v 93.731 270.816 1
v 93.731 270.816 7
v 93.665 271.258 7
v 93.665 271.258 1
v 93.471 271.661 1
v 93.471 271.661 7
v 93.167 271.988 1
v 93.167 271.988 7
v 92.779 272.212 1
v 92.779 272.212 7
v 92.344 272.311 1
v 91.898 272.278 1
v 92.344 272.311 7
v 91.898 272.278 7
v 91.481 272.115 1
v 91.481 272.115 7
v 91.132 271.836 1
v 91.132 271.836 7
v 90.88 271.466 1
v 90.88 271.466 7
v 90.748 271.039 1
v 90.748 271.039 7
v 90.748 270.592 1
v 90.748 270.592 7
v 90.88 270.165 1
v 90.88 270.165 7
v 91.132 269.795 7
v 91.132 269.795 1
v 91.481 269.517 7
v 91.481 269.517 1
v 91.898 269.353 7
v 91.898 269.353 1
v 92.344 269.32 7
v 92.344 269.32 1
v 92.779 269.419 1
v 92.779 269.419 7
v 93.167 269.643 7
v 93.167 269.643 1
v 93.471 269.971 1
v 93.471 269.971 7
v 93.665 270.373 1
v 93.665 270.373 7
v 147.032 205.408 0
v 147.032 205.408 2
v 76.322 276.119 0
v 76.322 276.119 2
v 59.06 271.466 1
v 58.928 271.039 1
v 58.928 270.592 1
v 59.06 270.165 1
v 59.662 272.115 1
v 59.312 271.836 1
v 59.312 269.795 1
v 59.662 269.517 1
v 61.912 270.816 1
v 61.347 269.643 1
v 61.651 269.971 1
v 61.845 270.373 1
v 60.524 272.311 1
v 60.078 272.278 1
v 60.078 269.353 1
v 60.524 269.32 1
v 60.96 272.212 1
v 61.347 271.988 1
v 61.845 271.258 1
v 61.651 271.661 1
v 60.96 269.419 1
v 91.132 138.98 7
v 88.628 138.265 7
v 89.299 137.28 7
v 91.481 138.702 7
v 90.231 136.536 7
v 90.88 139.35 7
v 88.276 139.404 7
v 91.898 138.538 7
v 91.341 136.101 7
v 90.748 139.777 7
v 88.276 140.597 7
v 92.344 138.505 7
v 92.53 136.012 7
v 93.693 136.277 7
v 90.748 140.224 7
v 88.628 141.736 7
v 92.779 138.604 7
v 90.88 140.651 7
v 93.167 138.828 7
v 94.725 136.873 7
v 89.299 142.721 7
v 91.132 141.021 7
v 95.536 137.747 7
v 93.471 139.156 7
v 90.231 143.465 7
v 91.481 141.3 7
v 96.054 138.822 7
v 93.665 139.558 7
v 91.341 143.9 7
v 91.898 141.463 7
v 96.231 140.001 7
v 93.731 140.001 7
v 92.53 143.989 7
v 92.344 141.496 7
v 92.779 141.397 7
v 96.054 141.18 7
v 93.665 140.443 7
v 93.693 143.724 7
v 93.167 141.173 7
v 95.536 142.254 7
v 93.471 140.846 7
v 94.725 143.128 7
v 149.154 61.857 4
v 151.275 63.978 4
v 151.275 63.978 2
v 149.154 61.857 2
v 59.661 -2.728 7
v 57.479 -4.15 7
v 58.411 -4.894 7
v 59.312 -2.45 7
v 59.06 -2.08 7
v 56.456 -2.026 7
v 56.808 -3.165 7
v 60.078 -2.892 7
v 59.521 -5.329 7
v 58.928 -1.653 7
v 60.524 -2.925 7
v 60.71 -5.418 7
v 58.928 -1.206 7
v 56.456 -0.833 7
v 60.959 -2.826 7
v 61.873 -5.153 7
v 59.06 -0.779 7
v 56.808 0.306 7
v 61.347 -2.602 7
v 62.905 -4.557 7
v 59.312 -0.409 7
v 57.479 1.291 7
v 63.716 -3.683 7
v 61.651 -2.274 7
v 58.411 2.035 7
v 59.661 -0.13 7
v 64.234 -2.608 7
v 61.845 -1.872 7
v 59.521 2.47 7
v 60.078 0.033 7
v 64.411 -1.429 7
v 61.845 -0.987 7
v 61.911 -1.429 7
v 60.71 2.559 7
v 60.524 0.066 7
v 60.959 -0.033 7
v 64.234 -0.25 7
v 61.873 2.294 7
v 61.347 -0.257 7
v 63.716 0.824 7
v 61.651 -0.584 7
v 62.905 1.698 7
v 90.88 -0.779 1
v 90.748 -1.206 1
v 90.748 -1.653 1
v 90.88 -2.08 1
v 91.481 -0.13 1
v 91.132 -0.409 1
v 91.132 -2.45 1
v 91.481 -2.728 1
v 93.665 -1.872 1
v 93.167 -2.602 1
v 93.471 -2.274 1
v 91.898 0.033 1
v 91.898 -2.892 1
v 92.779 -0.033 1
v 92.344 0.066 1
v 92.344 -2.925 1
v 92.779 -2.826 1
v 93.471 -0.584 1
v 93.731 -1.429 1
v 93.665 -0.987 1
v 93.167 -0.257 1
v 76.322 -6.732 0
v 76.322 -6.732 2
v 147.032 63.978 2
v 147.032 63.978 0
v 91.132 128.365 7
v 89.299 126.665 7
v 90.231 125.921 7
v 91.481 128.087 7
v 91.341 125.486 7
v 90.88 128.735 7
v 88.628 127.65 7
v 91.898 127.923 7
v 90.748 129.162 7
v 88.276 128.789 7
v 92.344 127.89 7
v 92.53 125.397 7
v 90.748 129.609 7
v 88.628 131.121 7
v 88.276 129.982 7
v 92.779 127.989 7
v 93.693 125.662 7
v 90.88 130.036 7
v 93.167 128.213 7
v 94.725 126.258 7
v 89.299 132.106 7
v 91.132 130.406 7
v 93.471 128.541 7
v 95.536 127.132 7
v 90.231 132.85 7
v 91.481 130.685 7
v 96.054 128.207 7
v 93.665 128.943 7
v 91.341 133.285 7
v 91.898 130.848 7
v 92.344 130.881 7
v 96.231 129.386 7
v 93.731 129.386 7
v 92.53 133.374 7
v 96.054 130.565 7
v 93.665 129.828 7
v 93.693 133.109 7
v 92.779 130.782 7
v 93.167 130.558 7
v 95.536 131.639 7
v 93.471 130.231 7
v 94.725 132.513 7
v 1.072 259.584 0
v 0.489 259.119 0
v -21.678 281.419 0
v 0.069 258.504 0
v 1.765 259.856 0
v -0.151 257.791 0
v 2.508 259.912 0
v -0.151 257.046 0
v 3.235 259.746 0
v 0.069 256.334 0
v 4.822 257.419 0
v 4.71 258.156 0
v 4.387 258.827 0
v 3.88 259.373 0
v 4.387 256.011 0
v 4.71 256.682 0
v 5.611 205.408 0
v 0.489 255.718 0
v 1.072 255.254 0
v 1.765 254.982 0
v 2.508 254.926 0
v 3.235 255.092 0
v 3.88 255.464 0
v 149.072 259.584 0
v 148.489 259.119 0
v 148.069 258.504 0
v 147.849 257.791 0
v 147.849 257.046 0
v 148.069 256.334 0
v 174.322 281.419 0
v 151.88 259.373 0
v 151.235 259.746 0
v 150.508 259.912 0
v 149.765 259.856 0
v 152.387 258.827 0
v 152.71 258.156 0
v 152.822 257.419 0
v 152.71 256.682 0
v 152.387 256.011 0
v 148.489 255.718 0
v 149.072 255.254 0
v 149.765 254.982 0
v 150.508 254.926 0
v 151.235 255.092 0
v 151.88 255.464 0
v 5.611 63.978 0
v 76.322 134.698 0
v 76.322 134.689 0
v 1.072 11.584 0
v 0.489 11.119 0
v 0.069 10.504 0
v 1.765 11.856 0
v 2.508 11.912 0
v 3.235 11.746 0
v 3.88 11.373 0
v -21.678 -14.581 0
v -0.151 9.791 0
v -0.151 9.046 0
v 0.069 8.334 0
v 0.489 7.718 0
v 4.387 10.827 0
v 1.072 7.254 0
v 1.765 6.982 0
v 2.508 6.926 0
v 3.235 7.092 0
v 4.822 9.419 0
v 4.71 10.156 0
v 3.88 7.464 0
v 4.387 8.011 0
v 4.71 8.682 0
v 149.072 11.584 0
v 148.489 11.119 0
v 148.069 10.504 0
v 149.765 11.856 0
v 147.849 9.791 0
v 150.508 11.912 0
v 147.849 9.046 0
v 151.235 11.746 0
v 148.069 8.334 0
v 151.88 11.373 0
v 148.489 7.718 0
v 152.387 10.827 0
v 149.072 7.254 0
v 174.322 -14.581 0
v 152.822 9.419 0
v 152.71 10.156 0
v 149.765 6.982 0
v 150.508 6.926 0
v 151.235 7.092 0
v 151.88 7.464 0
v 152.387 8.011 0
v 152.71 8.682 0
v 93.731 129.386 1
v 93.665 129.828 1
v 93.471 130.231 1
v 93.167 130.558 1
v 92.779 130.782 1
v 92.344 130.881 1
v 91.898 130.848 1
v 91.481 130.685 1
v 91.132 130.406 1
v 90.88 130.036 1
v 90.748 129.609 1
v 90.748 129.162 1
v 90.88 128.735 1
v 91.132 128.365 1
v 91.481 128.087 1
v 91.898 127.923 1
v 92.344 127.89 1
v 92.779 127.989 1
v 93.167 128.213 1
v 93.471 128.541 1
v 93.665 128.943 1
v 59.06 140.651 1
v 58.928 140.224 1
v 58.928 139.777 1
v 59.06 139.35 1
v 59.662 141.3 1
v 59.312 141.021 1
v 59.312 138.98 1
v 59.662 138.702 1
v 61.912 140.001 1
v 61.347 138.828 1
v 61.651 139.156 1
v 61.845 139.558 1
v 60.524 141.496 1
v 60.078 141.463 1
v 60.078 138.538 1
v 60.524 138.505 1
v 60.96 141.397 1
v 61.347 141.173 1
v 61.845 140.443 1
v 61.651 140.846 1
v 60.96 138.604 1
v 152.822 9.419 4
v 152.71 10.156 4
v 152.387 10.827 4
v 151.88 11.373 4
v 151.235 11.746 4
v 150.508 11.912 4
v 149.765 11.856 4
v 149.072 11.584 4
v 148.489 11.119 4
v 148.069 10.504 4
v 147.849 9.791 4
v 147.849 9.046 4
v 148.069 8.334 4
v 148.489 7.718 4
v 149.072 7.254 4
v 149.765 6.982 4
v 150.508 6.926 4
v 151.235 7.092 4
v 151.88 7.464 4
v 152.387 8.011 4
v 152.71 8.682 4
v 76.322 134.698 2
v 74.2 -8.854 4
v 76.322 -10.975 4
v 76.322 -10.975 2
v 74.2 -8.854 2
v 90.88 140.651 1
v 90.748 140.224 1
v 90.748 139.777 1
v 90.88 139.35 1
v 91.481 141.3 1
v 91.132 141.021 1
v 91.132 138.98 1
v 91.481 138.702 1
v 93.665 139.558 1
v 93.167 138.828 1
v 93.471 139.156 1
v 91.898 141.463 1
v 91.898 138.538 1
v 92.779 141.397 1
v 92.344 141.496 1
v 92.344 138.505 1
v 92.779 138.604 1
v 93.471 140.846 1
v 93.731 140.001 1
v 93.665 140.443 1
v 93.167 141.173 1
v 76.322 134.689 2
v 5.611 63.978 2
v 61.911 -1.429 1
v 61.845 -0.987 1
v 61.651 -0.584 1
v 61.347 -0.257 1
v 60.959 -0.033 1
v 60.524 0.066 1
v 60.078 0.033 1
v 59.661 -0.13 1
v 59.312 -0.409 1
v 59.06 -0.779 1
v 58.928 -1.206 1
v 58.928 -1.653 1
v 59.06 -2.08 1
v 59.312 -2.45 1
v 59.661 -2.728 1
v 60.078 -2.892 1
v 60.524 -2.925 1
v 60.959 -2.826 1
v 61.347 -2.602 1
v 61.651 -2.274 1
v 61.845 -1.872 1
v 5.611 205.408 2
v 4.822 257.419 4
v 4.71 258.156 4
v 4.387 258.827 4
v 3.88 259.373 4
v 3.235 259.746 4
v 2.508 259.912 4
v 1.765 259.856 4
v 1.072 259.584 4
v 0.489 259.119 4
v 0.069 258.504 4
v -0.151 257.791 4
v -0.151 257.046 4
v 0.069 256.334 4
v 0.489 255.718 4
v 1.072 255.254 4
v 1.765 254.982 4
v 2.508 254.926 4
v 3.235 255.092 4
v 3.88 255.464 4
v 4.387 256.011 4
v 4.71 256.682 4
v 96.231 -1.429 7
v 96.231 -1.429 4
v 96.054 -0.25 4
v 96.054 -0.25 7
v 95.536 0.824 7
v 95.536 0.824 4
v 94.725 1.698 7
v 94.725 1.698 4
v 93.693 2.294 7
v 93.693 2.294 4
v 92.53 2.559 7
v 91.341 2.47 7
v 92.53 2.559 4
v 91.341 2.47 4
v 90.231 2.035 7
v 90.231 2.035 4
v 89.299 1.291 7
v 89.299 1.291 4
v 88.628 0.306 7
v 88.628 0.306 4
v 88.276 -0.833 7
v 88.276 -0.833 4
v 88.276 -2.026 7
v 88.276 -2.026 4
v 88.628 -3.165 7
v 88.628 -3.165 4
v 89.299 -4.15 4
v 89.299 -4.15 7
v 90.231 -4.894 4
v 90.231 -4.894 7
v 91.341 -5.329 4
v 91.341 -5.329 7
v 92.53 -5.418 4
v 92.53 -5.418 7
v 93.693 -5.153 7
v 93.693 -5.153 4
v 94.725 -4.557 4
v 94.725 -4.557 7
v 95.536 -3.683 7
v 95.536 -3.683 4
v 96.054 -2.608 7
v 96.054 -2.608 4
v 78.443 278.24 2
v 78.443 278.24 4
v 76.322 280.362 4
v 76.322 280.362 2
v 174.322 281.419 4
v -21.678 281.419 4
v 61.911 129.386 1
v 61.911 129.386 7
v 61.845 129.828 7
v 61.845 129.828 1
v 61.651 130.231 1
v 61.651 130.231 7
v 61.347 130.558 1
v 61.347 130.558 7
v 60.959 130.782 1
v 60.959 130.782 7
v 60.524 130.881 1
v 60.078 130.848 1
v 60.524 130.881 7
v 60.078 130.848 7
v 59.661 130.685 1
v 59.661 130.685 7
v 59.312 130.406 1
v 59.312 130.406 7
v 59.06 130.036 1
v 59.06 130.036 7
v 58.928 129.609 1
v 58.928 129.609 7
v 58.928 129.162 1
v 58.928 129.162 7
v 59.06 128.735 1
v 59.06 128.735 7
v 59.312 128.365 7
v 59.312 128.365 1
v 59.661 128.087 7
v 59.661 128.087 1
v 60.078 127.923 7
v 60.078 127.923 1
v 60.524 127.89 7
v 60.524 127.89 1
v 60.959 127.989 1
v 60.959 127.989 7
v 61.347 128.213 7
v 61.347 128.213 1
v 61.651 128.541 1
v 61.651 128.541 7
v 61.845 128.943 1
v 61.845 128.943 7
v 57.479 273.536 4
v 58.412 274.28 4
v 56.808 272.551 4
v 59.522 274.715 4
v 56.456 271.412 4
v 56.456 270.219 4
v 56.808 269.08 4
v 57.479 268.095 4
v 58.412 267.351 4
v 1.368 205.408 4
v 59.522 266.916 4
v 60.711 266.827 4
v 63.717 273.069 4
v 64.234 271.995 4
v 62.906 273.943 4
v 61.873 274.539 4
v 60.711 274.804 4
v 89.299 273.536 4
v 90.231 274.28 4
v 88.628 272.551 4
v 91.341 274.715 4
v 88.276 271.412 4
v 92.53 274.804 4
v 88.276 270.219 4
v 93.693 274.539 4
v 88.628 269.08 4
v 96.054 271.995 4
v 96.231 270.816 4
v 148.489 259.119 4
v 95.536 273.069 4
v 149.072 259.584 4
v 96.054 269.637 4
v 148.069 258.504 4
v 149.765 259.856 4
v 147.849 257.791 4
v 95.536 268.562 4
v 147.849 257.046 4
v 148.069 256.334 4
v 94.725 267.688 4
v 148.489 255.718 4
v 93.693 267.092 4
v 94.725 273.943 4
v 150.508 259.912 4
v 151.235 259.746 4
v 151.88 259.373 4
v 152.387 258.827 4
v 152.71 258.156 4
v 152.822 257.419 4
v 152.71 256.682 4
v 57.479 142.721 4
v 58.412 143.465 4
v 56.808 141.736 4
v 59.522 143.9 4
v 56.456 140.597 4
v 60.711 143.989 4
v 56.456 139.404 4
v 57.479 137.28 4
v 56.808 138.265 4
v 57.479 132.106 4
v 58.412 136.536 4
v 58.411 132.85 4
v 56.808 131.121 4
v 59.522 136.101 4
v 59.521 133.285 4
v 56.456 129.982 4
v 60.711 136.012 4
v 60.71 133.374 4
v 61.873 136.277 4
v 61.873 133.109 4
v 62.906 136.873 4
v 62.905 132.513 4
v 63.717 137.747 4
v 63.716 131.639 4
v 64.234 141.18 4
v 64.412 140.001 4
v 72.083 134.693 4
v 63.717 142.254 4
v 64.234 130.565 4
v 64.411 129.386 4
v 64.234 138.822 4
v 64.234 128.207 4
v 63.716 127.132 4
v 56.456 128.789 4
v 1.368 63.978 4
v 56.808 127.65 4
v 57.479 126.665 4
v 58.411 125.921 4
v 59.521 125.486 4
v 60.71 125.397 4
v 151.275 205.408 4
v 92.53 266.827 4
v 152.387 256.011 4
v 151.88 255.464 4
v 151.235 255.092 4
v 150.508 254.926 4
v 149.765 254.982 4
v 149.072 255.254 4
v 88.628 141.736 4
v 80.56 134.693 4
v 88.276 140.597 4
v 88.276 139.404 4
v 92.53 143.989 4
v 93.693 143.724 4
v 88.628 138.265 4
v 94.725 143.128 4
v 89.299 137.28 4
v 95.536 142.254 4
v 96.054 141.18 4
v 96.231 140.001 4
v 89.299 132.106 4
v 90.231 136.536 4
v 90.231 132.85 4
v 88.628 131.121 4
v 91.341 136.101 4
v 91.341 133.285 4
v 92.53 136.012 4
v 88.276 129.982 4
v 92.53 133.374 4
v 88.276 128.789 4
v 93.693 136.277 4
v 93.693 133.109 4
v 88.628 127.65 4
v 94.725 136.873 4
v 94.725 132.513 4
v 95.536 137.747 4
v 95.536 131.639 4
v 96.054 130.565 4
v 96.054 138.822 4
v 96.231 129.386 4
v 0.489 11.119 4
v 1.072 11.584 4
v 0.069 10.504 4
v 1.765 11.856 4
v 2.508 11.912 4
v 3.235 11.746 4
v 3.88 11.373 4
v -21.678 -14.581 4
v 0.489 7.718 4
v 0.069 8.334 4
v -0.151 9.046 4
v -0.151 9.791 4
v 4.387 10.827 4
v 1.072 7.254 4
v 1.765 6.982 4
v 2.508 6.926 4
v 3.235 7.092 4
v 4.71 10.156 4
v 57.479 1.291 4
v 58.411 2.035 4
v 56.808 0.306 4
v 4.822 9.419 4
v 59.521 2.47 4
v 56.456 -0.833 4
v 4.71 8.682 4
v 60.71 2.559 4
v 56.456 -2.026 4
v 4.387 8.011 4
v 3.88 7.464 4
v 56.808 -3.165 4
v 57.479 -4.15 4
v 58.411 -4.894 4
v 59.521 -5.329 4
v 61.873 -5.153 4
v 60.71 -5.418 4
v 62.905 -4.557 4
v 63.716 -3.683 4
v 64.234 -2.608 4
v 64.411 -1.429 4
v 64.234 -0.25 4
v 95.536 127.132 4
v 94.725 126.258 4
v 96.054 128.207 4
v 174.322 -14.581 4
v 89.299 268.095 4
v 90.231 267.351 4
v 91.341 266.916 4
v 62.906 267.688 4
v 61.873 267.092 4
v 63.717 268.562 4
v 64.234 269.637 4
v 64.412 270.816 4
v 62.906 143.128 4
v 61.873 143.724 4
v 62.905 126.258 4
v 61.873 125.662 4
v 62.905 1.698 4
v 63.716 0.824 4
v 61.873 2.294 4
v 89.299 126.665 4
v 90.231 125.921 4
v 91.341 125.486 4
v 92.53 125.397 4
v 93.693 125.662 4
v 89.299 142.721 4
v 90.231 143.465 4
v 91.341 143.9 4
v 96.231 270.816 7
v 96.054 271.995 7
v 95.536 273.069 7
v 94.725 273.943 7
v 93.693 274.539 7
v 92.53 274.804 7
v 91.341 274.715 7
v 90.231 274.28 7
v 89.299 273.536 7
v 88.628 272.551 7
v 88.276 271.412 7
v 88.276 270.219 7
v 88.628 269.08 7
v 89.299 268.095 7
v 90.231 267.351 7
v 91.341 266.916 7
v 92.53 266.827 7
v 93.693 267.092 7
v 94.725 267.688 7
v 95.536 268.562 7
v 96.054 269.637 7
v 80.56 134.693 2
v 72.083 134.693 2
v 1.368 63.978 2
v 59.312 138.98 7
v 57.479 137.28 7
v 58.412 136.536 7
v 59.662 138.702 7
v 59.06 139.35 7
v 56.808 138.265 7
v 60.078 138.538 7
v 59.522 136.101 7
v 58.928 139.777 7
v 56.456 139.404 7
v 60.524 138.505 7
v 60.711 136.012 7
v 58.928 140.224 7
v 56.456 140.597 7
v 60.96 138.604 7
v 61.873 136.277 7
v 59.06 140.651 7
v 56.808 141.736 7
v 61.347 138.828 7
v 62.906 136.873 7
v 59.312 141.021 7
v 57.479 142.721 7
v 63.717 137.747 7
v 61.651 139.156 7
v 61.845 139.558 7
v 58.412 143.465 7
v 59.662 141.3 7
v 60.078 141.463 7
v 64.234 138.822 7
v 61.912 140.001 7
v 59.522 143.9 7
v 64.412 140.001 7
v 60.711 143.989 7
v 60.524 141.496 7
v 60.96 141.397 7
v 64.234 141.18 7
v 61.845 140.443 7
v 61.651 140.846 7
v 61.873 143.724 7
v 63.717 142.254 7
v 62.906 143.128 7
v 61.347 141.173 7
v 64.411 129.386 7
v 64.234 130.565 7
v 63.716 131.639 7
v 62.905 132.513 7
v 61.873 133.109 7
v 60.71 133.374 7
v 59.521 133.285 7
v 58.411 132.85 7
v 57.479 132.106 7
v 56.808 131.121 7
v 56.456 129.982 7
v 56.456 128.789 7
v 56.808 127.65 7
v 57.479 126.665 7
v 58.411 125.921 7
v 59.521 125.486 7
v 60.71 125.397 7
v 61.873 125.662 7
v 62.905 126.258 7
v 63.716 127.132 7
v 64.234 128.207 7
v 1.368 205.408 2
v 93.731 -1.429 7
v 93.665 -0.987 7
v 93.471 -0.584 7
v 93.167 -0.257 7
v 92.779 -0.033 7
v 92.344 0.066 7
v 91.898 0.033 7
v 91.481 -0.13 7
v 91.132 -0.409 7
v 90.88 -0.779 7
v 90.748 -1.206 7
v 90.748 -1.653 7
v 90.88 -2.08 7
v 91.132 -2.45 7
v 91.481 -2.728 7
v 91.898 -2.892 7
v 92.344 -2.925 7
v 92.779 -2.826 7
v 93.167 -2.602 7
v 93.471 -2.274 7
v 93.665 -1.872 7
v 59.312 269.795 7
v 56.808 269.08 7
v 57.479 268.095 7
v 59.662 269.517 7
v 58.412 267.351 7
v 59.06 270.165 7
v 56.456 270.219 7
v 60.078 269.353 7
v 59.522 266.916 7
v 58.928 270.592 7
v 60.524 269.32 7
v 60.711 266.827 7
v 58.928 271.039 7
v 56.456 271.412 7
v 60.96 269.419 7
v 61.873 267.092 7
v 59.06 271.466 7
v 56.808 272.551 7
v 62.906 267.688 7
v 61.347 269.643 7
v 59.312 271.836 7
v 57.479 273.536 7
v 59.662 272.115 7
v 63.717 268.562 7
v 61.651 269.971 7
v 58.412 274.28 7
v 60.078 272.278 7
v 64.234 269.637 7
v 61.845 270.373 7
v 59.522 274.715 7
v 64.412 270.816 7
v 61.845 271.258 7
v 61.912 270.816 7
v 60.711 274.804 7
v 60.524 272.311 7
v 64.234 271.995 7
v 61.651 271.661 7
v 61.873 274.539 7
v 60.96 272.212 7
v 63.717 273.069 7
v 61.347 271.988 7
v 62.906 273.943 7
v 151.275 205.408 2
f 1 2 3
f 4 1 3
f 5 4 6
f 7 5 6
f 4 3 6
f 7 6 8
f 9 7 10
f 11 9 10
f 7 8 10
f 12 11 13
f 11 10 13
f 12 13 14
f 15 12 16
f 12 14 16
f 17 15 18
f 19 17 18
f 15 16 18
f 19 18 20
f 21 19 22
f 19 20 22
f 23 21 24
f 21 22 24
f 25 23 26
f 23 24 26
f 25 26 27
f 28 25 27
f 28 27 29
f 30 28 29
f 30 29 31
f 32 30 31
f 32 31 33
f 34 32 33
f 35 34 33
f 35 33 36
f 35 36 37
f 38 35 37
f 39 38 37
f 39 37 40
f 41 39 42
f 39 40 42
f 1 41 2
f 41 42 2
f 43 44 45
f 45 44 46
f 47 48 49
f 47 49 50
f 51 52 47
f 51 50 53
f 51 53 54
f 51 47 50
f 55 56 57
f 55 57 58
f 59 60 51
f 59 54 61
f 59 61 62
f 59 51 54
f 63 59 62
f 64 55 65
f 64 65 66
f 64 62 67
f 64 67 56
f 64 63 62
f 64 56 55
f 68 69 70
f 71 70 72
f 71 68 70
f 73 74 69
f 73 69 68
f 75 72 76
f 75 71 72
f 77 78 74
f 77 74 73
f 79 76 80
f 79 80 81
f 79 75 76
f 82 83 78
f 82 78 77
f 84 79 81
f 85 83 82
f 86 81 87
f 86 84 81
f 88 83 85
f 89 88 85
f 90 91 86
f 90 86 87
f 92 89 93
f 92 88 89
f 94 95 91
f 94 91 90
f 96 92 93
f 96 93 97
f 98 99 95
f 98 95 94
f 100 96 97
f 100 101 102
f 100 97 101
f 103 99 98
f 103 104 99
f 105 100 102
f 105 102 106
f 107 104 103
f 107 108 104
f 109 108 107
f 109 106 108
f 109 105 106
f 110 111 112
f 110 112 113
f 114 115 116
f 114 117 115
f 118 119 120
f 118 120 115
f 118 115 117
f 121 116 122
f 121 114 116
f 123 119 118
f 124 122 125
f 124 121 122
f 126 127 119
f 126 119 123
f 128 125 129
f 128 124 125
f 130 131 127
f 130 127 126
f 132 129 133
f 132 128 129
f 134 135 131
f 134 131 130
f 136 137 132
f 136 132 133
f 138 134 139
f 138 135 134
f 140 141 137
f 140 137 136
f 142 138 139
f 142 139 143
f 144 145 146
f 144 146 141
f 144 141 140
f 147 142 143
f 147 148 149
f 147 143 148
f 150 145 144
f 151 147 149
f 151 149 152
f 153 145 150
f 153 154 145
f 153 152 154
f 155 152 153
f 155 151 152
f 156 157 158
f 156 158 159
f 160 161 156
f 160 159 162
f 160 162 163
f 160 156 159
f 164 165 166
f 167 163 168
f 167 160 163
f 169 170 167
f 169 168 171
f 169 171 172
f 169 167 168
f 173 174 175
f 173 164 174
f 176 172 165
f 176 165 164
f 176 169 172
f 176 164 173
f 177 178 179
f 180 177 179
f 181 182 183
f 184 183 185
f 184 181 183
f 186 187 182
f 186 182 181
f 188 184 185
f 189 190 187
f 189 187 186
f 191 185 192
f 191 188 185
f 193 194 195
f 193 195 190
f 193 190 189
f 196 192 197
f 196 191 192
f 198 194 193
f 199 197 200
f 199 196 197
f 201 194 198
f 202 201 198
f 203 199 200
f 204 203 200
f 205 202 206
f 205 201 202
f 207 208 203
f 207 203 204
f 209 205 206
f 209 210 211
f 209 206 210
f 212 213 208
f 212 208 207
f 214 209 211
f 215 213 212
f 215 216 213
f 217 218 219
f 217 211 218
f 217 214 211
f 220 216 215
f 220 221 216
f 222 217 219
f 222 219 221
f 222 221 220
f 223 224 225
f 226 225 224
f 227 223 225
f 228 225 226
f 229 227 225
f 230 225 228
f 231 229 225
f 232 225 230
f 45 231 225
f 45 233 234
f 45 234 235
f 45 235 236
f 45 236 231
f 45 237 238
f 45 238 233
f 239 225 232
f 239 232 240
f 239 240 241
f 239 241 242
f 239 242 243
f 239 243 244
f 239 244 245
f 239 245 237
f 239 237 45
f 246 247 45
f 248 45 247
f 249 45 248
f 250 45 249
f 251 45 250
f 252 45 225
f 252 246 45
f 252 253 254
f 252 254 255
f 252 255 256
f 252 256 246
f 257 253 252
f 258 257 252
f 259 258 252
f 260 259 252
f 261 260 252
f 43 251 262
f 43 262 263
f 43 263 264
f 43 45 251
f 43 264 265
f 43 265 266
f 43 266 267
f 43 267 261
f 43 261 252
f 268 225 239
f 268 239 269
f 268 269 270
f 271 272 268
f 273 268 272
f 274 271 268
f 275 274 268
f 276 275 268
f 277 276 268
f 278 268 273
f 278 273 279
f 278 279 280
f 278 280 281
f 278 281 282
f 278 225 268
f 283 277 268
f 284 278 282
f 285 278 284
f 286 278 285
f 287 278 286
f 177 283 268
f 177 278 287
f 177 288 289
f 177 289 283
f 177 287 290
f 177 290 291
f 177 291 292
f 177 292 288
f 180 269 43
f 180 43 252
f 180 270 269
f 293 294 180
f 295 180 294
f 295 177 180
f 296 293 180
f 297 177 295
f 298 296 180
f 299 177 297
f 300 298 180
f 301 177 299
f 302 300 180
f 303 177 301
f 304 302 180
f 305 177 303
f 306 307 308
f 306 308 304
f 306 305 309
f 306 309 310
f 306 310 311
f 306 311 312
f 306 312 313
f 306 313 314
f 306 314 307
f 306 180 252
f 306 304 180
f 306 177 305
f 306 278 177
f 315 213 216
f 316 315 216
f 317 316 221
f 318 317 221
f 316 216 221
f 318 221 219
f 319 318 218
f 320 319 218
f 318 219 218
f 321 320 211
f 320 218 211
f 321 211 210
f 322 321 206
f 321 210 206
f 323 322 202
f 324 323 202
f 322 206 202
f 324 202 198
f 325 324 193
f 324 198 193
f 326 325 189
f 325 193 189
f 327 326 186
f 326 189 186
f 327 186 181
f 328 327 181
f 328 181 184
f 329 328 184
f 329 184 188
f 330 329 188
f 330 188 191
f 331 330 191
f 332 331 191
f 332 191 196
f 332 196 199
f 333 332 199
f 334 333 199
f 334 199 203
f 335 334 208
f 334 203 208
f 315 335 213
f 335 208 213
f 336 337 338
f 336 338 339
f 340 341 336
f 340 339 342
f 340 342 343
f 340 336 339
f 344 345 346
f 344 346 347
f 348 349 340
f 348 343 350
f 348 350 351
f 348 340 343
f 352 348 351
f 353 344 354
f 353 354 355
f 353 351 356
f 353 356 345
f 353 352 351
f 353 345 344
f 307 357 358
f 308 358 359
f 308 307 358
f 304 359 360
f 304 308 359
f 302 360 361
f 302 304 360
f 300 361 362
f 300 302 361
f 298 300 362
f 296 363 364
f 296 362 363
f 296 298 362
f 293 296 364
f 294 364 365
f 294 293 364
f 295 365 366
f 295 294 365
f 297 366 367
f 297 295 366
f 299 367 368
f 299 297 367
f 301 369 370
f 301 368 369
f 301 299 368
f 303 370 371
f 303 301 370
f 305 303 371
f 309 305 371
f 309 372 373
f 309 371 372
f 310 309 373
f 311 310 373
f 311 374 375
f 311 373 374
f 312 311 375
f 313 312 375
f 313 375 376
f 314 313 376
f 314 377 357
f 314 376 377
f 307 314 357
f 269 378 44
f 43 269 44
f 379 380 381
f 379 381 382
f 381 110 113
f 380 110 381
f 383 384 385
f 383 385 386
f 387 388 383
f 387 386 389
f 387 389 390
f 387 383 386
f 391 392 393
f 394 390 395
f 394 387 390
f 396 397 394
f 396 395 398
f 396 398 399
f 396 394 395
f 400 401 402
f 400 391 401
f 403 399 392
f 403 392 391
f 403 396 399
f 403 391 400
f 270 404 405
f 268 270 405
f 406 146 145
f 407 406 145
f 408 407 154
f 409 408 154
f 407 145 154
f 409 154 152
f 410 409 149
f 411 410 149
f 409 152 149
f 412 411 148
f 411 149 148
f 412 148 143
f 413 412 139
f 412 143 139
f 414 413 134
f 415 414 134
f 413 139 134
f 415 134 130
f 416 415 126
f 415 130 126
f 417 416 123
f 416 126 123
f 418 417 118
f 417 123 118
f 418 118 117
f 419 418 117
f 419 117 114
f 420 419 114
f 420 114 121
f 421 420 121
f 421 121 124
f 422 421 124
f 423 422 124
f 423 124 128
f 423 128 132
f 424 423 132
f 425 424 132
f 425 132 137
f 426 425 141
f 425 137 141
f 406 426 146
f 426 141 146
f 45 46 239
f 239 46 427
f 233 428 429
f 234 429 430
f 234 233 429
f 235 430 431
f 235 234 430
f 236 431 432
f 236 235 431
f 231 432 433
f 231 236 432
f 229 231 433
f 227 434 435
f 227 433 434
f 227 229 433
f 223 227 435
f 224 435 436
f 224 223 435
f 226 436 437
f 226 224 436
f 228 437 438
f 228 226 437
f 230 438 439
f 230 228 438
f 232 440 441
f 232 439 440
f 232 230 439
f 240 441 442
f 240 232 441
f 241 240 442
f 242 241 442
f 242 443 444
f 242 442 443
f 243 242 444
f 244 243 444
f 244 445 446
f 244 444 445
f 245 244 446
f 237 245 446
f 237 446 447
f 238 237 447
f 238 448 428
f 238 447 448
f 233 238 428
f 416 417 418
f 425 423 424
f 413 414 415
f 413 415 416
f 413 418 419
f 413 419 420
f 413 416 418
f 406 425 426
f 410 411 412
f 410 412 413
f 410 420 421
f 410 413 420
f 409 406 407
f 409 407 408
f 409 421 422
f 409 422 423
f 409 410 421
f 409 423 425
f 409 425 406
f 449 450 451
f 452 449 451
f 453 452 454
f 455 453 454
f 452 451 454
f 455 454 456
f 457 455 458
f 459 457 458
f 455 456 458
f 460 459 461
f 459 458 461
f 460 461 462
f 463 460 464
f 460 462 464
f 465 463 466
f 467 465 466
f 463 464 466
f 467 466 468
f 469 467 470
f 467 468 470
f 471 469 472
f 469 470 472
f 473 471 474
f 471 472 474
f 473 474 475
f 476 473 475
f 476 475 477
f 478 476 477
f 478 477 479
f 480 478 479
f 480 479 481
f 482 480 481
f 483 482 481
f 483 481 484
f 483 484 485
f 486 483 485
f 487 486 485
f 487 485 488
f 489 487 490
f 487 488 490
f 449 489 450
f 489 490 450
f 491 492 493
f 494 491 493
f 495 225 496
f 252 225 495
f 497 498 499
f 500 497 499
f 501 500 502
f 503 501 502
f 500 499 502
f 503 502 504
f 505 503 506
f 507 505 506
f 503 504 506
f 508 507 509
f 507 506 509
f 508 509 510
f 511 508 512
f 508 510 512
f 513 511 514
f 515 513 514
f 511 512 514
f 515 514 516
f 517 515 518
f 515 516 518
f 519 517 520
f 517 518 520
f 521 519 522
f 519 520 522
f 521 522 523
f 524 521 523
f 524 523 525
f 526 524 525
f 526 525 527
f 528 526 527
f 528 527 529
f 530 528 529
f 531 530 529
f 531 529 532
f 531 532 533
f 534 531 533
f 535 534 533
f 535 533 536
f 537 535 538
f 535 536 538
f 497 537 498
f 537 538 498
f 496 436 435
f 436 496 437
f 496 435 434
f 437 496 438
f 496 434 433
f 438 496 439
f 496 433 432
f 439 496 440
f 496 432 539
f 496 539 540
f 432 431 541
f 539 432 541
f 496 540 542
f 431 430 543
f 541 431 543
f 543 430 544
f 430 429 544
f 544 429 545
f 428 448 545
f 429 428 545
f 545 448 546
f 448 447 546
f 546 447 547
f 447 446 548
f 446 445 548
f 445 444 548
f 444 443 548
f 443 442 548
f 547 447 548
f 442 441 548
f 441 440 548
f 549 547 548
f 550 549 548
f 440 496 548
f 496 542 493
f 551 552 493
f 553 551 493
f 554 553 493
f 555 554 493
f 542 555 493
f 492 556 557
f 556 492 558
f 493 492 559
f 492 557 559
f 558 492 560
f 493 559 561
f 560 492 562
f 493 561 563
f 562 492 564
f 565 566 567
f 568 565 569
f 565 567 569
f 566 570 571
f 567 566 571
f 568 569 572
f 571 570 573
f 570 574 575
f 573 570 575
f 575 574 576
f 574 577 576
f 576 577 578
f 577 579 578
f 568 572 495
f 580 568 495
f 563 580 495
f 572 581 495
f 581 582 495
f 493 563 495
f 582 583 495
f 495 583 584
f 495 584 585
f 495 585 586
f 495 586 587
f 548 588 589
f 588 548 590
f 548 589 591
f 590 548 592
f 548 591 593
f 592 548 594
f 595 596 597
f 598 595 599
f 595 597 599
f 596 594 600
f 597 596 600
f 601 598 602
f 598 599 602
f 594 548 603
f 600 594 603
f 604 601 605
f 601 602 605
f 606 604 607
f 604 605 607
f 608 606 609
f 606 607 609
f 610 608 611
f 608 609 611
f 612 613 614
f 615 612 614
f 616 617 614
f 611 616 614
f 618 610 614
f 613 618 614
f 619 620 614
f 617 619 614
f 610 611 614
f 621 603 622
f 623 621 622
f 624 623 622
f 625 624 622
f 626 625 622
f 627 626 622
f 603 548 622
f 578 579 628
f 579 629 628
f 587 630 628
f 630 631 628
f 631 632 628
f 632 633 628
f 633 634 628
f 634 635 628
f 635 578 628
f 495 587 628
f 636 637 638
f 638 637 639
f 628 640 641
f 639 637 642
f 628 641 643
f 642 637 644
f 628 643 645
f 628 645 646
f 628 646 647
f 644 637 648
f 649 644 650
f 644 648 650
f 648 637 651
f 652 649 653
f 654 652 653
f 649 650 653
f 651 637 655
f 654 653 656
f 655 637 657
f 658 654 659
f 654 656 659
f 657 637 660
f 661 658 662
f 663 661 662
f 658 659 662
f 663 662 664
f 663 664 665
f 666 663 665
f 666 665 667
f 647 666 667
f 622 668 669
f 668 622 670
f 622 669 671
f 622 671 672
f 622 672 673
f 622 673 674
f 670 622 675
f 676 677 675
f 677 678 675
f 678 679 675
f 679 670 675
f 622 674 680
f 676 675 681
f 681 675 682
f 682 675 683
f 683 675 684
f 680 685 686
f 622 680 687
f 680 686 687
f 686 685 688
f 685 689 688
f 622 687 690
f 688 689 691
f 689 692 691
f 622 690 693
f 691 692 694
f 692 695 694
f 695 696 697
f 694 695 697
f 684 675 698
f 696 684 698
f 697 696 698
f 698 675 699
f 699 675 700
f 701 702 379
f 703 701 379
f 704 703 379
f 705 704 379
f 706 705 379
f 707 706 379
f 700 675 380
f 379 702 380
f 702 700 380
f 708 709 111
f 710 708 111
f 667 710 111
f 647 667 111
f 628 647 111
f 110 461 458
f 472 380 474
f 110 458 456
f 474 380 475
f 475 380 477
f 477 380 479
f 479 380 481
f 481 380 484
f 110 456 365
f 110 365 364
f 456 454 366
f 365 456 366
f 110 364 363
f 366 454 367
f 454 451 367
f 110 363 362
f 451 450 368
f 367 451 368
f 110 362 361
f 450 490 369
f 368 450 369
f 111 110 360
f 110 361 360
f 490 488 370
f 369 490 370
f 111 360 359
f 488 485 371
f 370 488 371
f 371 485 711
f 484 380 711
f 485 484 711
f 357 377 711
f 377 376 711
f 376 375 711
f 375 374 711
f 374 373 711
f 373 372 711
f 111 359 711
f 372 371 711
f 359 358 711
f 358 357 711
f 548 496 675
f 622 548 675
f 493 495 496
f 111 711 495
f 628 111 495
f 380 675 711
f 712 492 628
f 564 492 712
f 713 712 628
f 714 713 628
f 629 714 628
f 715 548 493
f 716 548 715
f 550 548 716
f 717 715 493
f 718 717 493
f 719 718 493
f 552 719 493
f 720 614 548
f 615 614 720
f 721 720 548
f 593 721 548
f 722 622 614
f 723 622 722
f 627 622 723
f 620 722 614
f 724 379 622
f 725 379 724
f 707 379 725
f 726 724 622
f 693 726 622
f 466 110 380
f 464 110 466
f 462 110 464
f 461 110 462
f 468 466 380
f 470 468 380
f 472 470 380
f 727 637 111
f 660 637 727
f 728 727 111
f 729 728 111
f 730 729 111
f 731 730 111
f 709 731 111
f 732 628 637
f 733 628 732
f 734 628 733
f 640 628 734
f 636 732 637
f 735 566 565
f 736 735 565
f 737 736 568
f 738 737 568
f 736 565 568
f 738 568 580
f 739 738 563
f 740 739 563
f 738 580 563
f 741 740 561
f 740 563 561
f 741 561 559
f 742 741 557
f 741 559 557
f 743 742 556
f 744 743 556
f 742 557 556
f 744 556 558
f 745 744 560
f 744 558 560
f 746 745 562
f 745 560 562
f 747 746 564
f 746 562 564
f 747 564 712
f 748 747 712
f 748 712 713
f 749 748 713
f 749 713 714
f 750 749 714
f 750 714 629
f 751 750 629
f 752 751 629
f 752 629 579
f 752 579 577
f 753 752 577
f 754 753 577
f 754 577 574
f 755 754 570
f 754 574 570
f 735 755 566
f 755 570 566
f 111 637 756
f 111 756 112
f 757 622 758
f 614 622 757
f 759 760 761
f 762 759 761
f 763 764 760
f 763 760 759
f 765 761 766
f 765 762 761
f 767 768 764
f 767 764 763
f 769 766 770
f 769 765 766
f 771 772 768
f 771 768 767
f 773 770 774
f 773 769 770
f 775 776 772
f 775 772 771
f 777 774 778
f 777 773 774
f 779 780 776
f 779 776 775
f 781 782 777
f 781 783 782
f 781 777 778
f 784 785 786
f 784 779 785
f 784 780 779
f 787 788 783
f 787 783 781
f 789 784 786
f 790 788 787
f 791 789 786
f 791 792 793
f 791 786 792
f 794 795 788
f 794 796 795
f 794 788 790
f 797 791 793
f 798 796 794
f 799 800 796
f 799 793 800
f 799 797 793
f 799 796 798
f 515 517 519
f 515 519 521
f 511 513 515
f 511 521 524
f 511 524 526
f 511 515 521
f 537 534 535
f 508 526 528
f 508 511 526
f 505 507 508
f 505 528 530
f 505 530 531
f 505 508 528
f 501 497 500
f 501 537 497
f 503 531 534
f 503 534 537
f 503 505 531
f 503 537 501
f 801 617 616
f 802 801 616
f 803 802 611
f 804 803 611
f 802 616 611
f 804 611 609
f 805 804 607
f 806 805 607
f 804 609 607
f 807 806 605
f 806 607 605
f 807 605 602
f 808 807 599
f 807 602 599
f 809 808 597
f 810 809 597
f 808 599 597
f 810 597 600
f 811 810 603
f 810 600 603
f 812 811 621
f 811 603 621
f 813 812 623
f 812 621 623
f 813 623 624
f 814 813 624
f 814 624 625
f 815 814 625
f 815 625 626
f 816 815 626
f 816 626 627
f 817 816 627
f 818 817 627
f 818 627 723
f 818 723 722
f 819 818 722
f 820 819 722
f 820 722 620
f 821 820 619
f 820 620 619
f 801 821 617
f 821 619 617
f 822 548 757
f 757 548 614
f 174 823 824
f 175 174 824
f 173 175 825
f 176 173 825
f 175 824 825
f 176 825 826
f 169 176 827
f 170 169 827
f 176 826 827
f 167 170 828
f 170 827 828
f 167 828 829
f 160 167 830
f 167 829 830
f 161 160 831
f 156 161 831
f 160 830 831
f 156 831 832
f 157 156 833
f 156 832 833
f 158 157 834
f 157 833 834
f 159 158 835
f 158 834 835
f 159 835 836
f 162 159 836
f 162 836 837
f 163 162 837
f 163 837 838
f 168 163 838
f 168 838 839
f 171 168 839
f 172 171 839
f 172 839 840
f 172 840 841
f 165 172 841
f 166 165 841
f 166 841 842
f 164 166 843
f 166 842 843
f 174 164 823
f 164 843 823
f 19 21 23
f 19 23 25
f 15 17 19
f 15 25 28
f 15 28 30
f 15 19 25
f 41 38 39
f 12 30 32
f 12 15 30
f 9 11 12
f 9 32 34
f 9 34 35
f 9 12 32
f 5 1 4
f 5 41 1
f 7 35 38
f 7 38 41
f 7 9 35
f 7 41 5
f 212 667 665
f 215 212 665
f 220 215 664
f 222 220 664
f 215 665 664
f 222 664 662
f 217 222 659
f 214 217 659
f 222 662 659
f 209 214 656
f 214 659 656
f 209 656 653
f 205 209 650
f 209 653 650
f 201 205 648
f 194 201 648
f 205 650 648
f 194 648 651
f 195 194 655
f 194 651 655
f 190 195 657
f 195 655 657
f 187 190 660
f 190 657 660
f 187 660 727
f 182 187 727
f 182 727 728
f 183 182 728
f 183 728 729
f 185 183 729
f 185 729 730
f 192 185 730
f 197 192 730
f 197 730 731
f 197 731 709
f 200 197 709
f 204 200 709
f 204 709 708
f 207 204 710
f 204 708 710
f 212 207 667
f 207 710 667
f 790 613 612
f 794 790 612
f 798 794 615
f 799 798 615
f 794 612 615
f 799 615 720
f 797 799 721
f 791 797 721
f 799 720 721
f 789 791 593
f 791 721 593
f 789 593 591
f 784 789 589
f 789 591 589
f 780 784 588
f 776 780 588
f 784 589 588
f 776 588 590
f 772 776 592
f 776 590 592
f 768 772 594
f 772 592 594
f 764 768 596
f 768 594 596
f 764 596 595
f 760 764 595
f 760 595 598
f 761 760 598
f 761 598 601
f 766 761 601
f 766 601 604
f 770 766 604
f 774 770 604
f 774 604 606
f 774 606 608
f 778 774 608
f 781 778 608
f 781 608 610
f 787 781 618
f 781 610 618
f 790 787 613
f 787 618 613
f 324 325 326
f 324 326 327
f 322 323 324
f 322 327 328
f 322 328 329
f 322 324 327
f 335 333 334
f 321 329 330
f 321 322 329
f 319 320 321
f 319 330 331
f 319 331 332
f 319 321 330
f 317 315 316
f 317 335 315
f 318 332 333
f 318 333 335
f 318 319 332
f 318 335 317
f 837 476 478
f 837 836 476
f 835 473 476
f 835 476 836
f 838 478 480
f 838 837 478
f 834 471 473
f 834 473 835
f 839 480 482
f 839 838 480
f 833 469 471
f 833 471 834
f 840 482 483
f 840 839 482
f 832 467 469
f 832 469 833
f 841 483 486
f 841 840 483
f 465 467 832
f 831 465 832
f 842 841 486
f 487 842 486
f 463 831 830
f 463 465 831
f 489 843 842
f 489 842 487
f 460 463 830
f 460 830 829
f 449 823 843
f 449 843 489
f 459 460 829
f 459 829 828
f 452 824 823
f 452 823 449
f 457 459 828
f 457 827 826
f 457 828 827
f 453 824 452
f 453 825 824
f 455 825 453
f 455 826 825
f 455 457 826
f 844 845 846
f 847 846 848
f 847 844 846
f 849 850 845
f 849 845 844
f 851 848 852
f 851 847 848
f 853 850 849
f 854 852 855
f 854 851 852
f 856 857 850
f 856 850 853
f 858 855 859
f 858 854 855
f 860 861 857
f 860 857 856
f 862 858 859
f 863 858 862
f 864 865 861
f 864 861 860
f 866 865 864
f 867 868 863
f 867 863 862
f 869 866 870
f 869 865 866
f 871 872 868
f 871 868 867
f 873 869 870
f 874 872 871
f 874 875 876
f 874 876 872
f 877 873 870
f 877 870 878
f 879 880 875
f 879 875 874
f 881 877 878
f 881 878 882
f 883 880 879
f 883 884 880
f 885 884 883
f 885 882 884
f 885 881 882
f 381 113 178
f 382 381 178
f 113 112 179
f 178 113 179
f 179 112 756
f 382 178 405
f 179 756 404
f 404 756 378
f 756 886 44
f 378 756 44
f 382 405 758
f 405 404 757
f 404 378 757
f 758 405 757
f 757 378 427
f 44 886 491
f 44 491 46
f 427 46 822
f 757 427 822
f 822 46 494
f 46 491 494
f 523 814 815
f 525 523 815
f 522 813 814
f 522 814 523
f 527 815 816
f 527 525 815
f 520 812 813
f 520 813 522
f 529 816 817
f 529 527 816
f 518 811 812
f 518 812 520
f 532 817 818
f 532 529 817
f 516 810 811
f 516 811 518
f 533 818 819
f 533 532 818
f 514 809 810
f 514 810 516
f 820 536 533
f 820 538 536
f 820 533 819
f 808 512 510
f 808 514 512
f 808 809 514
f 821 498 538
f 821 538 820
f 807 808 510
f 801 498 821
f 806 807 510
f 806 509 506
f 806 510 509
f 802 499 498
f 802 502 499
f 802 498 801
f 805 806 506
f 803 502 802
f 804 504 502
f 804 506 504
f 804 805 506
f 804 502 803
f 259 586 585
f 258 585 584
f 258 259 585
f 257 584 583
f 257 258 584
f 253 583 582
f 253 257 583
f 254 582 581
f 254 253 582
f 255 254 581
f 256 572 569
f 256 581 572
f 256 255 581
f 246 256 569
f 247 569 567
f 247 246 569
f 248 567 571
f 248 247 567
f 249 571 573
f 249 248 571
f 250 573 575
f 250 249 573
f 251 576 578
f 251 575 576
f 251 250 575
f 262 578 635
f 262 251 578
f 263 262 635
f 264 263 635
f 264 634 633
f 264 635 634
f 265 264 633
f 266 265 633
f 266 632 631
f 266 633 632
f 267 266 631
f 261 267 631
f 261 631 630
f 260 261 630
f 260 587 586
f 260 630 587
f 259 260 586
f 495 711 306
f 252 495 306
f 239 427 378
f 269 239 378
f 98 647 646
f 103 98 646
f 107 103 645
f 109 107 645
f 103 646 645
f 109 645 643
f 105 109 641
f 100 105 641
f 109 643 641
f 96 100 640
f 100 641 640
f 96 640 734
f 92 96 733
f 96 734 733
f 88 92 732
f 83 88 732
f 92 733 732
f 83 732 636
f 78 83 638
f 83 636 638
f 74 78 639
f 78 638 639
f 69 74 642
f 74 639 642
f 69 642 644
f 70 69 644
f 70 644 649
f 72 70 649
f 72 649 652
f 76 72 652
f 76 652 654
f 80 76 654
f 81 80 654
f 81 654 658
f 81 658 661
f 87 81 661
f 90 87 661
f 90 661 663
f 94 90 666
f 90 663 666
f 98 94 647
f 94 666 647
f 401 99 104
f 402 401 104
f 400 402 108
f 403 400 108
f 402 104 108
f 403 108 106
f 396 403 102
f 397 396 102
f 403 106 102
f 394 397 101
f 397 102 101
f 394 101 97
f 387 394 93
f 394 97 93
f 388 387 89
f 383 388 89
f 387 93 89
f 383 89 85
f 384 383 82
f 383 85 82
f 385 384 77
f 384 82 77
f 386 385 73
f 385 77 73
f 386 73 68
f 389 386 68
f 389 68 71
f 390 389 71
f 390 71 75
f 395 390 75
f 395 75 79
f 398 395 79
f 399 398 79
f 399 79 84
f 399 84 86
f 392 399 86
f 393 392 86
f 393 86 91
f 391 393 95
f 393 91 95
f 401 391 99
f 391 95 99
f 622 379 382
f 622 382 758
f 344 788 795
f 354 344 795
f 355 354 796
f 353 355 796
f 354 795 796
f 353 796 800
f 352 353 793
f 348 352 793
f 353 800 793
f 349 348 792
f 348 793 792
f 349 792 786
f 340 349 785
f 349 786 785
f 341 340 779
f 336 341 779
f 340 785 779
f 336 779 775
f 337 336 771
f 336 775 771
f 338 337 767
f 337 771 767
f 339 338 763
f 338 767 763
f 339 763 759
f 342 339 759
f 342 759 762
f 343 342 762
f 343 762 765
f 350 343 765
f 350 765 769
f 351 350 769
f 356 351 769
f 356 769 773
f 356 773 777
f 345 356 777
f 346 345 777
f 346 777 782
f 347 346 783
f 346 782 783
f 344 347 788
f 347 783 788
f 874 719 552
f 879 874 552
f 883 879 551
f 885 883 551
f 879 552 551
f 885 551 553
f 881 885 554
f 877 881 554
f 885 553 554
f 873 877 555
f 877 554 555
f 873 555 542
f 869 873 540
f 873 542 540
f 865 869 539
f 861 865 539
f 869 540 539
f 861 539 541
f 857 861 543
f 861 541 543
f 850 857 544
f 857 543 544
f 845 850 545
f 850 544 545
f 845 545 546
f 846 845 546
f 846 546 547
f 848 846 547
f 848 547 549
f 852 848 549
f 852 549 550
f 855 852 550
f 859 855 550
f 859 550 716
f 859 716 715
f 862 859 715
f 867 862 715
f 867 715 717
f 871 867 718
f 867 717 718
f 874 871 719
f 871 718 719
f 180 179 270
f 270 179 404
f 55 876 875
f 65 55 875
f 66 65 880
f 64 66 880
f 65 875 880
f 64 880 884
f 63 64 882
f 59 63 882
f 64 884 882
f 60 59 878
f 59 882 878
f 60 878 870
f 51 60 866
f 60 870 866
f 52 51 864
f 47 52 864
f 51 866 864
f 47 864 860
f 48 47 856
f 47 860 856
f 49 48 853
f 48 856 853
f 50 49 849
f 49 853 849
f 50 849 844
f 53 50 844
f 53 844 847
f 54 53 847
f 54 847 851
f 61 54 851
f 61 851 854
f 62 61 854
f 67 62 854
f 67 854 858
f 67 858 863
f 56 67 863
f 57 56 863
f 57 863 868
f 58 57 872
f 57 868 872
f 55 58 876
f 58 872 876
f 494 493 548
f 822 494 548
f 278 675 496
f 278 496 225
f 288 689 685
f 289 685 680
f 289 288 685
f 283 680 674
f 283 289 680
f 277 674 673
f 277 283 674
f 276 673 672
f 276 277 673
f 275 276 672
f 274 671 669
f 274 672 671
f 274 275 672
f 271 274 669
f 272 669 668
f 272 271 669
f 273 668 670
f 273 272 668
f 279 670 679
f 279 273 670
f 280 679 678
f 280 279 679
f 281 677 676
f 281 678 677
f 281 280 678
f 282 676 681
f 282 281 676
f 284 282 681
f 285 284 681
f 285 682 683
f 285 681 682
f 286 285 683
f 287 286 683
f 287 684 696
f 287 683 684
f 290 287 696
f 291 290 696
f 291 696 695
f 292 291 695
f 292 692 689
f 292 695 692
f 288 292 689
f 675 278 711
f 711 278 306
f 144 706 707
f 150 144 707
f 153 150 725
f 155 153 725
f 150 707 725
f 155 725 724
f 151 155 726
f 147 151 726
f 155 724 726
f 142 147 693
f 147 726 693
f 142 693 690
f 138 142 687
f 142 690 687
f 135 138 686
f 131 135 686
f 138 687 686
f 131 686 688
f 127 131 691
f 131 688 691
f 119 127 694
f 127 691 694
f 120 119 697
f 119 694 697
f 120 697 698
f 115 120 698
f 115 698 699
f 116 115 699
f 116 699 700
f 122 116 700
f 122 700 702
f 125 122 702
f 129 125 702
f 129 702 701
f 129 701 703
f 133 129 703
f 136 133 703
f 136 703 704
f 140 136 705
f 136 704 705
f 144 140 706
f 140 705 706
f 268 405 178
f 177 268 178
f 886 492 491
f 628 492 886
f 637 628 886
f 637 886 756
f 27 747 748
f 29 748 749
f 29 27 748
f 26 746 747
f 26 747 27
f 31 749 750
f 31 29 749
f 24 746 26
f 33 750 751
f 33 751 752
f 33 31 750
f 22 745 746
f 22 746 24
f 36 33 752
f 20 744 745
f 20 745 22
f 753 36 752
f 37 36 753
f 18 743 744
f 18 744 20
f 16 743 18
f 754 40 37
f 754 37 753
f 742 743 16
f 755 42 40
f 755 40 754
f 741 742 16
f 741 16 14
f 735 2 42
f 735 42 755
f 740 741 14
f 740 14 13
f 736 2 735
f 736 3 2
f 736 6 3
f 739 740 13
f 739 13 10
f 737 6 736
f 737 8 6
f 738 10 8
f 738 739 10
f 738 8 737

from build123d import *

# Parameters (mm, degrees)
ESQUISSE1_W                          = 194
ESQUISSE1_H                          = 294
BOSS_EXTRU_1_DEPTH                   = 4
ESQUISSE2_R                          = 2.5
ENL_V_MAT_EXTRU_4_DEPTH              = 330.683341579
ENL_V_MAT_EXTRU_17_DEPTH             = 330.683341579
R_P_TITION_LIN_AIRE2_COUNT           = 2
R_P_TITION_LIN_AIRE2_PITCH           = 141.43
ESQUISSE5_R                          = 4
BOSS_EXTRU_2_DEPTH                   = 3
ESQUISSE6_R                          = 1.5
ENL_V_MAT_EXTRU_18_DEPTH             = 6
ESQUISSE7_R                          = 1.5
ENL_V_MAT_EXTRU_19_DEPTH             = 6
R_P_TITION_LIN_AIRE5_COUNT           = 2
R_P_TITION_LIN_AIRE5_PITCH           = 130.815
ESQUISSE10_R                         = 1.5
ENL_V_MAT_EXTRU_20_DEPTH             = 6
ESQUISSE9_R                          = 4
BOSS_EXTRU_3_DEPTH                   = 3
ESQUISSE11_R                         = 1.5
ENL_V_MAT_EXTRU_21_DEPTH             = 6
R_P_TITION_LIN_AIRE6_COUNT           = 2
R_P_TITION_LIN_AIRE6_PITCH           = 31.82
R_P_TITION_LIN_AIRE7_COPY_1_SKETCH_R = 4
R_P_TITION_LIN_AIRE7_COPY_1_DEPTH    = 3
R_P_TITION_LIN_AIRE7_COPY_2_SKETCH_R = 1.5
R_P_TITION_LIN_AIRE7_COPY_2_DEPTH    = 6
R_P_TITION_LIN_AIRE7_COPY_3_SKETCH_R = 4
R_P_TITION_LIN_AIRE7_COPY_3_DEPTH    = 3
R_P_TITION_LIN_AIRE7_COPY_4_SKETCH_R = 1.5
R_P_TITION_LIN_AIRE7_COPY_4_DEPTH    = 6
ENL_V_MAT_EXTRU_22_DEPTH             = 2
ENL_V_MAT_EXTRU_23_DEPTH             = 2
ENL_V_MAT_EXTRU_25_DEPTH             = 2
ENL_V_MAT_EXTRU_27_DEPTH             = 2
ENL_V_MAT_EXTRU_28_DEPTH             = 2
ENL_V_MAT_EXTRU_29_DEPTH             = 2
ENL_V_MAT_EXTRU_30_DEPTH             = 2
ENL_V_MAT_EXTRU_31_DEPTH             = 2
ESQUISSE23_W                         = 4
ESQUISSE23_H                         = 294
BOSS_EXTRU_4_DEPTH                   = 1
R_P_TITION_LIN_AIRE8_COUNT           = 2
R_P_TITION_LIN_AIRE8_PITCH           = 195
ESQUISSE24_W                         = 196
ESQUISSE24_H                         = 4
BOSS_EXTRU_5_DEPTH                   = 1
R_P_TITION_LIN_AIRE9_COUNT           = 2
R_P_TITION_LIN_AIRE9_PITCH           = 295


with BuildPart() as part:
    # Esquisse1 → Boss.-Extru.1 (new body)
    with BuildSketch(Plane.XY):
        with Locations((76.321557543, 133.418871343)):
            Rectangle(ESQUISSE1_W, ESQUISSE1_H)
    extrude(amount=BOSS_EXTRU_1_DEPTH)

    # Esquisse2 → Enlèv. mat.-Extru.4 (cut, through all)
    with BuildSketch(Plane.XY):
        with Locations((2.321557543, 257.418871343)):
            Circle(ESQUISSE2_R)
        with Locations((150.321557543, 257.418871343)):
            Circle(ESQUISSE2_R)
        with Locations((150.321557543, 9.418871343)):
            Circle(ESQUISSE2_R)
        with Locations((2.321557543, 9.418871343)):
            Circle(ESQUISSE2_R)
    extrude(amount=ENL_V_MAT_EXTRU_4_DEPTH, mode=Mode.SUBTRACT)

    # Esquisse4 → Enlèv. mat.-Extru.17 (cut, through all)
    with BuildSketch(Plane.XY.offset(4)):
        Polygon((147.032235662, 205.408193225), (76.321557543, 276.118871343), (5.610879425, 205.408193225), (76.321557543, 134.697515106), align=None)
    enl_v_mat_extru_17 = extrude(amount=-ENL_V_MAT_EXTRU_17_DEPTH, mode=Mode.SUBTRACT)

    # Répétition linéaire2: Enlèv. mat.-Extru.17 ×2
    with Locations(*[(0, -i * R_P_TITION_LIN_AIRE2_PITCH, 0) for i in range(1, R_P_TITION_LIN_AIRE2_COUNT)]):
        add(enl_v_mat_extru_17, mode=Mode.SUBTRACT)

    # Esquisse5 → Boss.-Extru.2 (add)
    with BuildSketch(Plane.XY.offset(4)):
        with Locations((60.411654967, 270.815570484)):
            Circle(ESQUISSE5_R)
        with Locations((92.23146012, 270.815570484)):
            Circle(ESQUISSE5_R)
    boss_extru_2 = extrude(amount=BOSS_EXTRU_2_DEPTH)

    # Esquisse6 → Enlèv. mat.-Extru.18 (cut)
    with BuildSketch(Plane.XY.offset(7)):
        with Locations((60.411654967, 270.815570484)):
            Circle(ESQUISSE6_R)
    enl_v_mat_extru_18 = extrude(amount=-ENL_V_MAT_EXTRU_18_DEPTH, mode=Mode.SUBTRACT)

    # Esquisse7 → Enlèv. mat.-Extru.19 (cut)
    with BuildSketch(Plane.XY.offset(7)):
        with Locations((92.23146012, 270.815570484)):
            Circle(ESQUISSE7_R)
    extrude(amount=-ENL_V_MAT_EXTRU_19_DEPTH, mode=Mode.SUBTRACT)

    # Répétition linéaire5: Boss.-Extru.2, Enlèv. mat.-Extru.18 ×2
    with Locations(*[(0, -i * R_P_TITION_LIN_AIRE5_PITCH, 0) for i in range(1, R_P_TITION_LIN_AIRE5_COUNT)]):
        add(boss_extru_2)
        add(enl_v_mat_extru_18, mode=Mode.SUBTRACT)

    # Esquisse10 → Enlèv. mat.-Extru.20 (cut)
    with BuildSketch(Plane.XY.offset(7)):
        with Locations((92.23146012, 140.000570484)):
            Circle(ESQUISSE10_R)
    extrude(amount=-ENL_V_MAT_EXTRU_20_DEPTH, mode=Mode.SUBTRACT)

    # Esquisse9 → Boss.-Extru.3 (add)
    with BuildSketch(Plane.XY.offset(4)):
        with Locations((92.23146012, 129.385570484)):
            Circle(ESQUISSE9_R)
    boss_extru_3 = extrude(amount=BOSS_EXTRU_3_DEPTH)

    # Esquisse11 → Enlèv. mat.-Extru.21 (cut)
    with BuildSketch(Plane.XY.offset(7)):
        with Locations((92.23146012, 129.385570484)):
            Circle(ESQUISSE11_R)
    enl_v_mat_extru_21 = extrude(amount=-ENL_V_MAT_EXTRU_21_DEPTH, mode=Mode.SUBTRACT)

    # Répétition linéaire6: Boss.-Extru.3, Enlèv. mat.-Extru.21 ×2
    with Locations(*[(-i * R_P_TITION_LIN_AIRE6_PITCH, 0, 0) for i in range(1, R_P_TITION_LIN_AIRE6_COUNT)]):
        add(boss_extru_3)
        add(enl_v_mat_extru_21, mode=Mode.SUBTRACT)

    # Répétition linéaire7 copy 1 sketch → Répétition linéaire7 copy 1 (add)
    with BuildSketch(Plane(origin=(-31.82, -130.815, 4), x_dir=(1, 0, 0), z_dir=(0, 0, 1))):
        with Locations((92.23146012, 129.385570484)):
            Circle(R_P_TITION_LIN_AIRE7_COPY_1_SKETCH_R)
    extrude(amount=R_P_TITION_LIN_AIRE7_COPY_1_DEPTH)

    # Répétition linéaire7 copy 2 sketch → Répétition linéaire7 copy 2 (cut)
    with BuildSketch(Plane(origin=(-31.82, -130.815, 7), x_dir=(1, 0, 0), z_dir=(0, 0, 1))):
        with Locations((92.23146012, 129.385570484)):
            Circle(R_P_TITION_LIN_AIRE7_COPY_2_SKETCH_R)
    extrude(amount=-R_P_TITION_LIN_AIRE7_COPY_2_DEPTH, mode=Mode.SUBTRACT)

    # Répétition linéaire7 copy 3 sketch → Répétition linéaire7 copy 3 (add)
    with BuildSketch(Plane(origin=(0, -130.815, 4), x_dir=(1, 0, 0), z_dir=(0, 0, 1))):
        with Locations((92.23146012, 129.385570484)):
            Circle(R_P_TITION_LIN_AIRE7_COPY_3_SKETCH_R)
    extrude(amount=R_P_TITION_LIN_AIRE7_COPY_3_DEPTH)

    # Répétition linéaire7 copy 4 sketch → Répétition linéaire7 copy 4 (cut)
    with BuildSketch(Plane(origin=(0, -130.815, 7), x_dir=(1, 0, 0), z_dir=(0, 0, 1))):
        with Locations((92.23146012, 129.385570484)):
            Circle(R_P_TITION_LIN_AIRE7_COPY_4_SKETCH_R)
    extrude(amount=-R_P_TITION_LIN_AIRE7_COPY_4_DEPTH, mode=Mode.SUBTRACT)

    # Esquisse13 → Enlèv. mat.-Extru.22 (cut)
    with BuildSketch(Plane.XY.offset(4)):
        Polygon((76.321557543, 276.118871343), (147.032235662, 205.408193225), (149.153556006, 207.529513568), (78.442877887, 278.240191687), align=None)
    extrude(amount=-ENL_V_MAT_EXTRU_22_DEPTH, mode=Mode.SUBTRACT)

    # Esquisse14 → Enlèv. mat.-Extru.23 (cut)
    with BuildSketch(Plane.XY.offset(4)):
        Polygon((5.610879425, 205.408193225), (78.442877887, 278.240191687), (76.321557543, 280.36151203), (3.489559081, 207.529513568), align=None)
    extrude(amount=-ENL_V_MAT_EXTRU_23_DEPTH, mode=Mode.SUBTRACT)

    # Esquisse15 → Enlèv. mat.-Extru.25 (cut)
    with BuildSketch(Plane.XY.offset(4)):
        Polygon((76.325879425, 134.693193225), (3.489559081, 207.529513568), (1.368238738, 205.408193225), (74.204559081, 132.571872881), align=None)
    extrude(amount=-ENL_V_MAT_EXTRU_25_DEPTH, mode=Mode.SUBTRACT)

    # Esquisse16 → Enlèv. mat.-Extru.27 (cut)
    with BuildSketch(Plane.XY.offset(4)):
        Polygon((76.317235662, 134.693193225), (149.153556006, 207.529513568), (151.274876349, 205.408193225), (78.438556006, 132.571872881), align=None)
    extrude(amount=-ENL_V_MAT_EXTRU_27_DEPTH, mode=Mode.SUBTRACT)

    # Esquisse19 → Enlèv. mat.-Extru.28 (cut)
    with BuildSketch(Plane.XY.offset(4)):
        Polygon((74.204559081, 132.571872881), (5.610879425, 63.978193225), (3.489559081, 66.099513568), (72.083238738, 134.693193225), align=None)
    extrude(amount=-ENL_V_MAT_EXTRU_28_DEPTH, mode=Mode.SUBTRACT)

    # Esquisse20 → Enlèv. mat.-Extru.29 (cut)
    with BuildSketch(Plane.XY.offset(4)):
        Polygon((3.489559081, 66.099513568), (76.321557543, -6.732484894), (74.2002372, -8.853805238), (1.368238738, 63.978193225), align=None)
    extrude(amount=-ENL_V_MAT_EXTRU_29_DEPTH, mode=Mode.SUBTRACT)

    # Esquisse21 → Enlèv. mat.-Extru.30 (cut)
    with BuildSketch(Plane.XY.offset(4)):
        Polygon((74.2002372, -8.853805238), (147.032235662, 63.978193225), (149.153556006, 61.856872881), (76.321557543, -10.975125581), align=None)
    extrude(amount=-ENL_V_MAT_EXTRU_30_DEPTH, mode=Mode.SUBTRACT)

    # Esquisse22 → Enlèv. mat.-Extru.31 (cut)
    with BuildSketch(Plane.XY.offset(4)):
        Polygon((149.153556006, 61.856872881), (78.438556006, 132.571872881), (80.559876349, 134.693193225), (151.274876349, 63.978193225), align=None)
    extrude(amount=-ENL_V_MAT_EXTRU_31_DEPTH, mode=Mode.SUBTRACT)

    # Esquisse23 → Boss.-Extru.4 (add)
    with BuildSketch(Plane(origin=(173.321557543, 0, 0), x_dir=(0, 0, -1), z_dir=(1, 0, 0))):
        with Locations((-2, 133.418871343)):
            Rectangle(ESQUISSE23_W, ESQUISSE23_H)
    boss_extru_4 = extrude(amount=BOSS_EXTRU_4_DEPTH)

    # Répétition linéaire8: Boss.-Extru.4 ×2
    with Locations(*[(-i * R_P_TITION_LIN_AIRE8_PITCH, 0, 0) for i in range(1, R_P_TITION_LIN_AIRE8_COUNT)]):
        add(boss_extru_4)

    # Esquisse24 → Boss.-Extru.5 (add)
    with BuildSketch(Plane(origin=(0, 280.418871343, 0), x_dir=(1, 0, 0), z_dir=(0, 1, 0))):
        with Locations((76.321557543, -2)):
            Rectangle(ESQUISSE24_W, ESQUISSE24_H)
    boss_extru_5 = extrude(amount=BOSS_EXTRU_5_DEPTH)

    # Répétition linéaire9: Boss.-Extru.5 ×2
    with Locations(*[(0, -i * R_P_TITION_LIN_AIRE9_PITCH, 0) for i in range(1, R_P_TITION_LIN_AIRE9_COUNT)]):
        add(boss_extru_5)


solid = part.part
